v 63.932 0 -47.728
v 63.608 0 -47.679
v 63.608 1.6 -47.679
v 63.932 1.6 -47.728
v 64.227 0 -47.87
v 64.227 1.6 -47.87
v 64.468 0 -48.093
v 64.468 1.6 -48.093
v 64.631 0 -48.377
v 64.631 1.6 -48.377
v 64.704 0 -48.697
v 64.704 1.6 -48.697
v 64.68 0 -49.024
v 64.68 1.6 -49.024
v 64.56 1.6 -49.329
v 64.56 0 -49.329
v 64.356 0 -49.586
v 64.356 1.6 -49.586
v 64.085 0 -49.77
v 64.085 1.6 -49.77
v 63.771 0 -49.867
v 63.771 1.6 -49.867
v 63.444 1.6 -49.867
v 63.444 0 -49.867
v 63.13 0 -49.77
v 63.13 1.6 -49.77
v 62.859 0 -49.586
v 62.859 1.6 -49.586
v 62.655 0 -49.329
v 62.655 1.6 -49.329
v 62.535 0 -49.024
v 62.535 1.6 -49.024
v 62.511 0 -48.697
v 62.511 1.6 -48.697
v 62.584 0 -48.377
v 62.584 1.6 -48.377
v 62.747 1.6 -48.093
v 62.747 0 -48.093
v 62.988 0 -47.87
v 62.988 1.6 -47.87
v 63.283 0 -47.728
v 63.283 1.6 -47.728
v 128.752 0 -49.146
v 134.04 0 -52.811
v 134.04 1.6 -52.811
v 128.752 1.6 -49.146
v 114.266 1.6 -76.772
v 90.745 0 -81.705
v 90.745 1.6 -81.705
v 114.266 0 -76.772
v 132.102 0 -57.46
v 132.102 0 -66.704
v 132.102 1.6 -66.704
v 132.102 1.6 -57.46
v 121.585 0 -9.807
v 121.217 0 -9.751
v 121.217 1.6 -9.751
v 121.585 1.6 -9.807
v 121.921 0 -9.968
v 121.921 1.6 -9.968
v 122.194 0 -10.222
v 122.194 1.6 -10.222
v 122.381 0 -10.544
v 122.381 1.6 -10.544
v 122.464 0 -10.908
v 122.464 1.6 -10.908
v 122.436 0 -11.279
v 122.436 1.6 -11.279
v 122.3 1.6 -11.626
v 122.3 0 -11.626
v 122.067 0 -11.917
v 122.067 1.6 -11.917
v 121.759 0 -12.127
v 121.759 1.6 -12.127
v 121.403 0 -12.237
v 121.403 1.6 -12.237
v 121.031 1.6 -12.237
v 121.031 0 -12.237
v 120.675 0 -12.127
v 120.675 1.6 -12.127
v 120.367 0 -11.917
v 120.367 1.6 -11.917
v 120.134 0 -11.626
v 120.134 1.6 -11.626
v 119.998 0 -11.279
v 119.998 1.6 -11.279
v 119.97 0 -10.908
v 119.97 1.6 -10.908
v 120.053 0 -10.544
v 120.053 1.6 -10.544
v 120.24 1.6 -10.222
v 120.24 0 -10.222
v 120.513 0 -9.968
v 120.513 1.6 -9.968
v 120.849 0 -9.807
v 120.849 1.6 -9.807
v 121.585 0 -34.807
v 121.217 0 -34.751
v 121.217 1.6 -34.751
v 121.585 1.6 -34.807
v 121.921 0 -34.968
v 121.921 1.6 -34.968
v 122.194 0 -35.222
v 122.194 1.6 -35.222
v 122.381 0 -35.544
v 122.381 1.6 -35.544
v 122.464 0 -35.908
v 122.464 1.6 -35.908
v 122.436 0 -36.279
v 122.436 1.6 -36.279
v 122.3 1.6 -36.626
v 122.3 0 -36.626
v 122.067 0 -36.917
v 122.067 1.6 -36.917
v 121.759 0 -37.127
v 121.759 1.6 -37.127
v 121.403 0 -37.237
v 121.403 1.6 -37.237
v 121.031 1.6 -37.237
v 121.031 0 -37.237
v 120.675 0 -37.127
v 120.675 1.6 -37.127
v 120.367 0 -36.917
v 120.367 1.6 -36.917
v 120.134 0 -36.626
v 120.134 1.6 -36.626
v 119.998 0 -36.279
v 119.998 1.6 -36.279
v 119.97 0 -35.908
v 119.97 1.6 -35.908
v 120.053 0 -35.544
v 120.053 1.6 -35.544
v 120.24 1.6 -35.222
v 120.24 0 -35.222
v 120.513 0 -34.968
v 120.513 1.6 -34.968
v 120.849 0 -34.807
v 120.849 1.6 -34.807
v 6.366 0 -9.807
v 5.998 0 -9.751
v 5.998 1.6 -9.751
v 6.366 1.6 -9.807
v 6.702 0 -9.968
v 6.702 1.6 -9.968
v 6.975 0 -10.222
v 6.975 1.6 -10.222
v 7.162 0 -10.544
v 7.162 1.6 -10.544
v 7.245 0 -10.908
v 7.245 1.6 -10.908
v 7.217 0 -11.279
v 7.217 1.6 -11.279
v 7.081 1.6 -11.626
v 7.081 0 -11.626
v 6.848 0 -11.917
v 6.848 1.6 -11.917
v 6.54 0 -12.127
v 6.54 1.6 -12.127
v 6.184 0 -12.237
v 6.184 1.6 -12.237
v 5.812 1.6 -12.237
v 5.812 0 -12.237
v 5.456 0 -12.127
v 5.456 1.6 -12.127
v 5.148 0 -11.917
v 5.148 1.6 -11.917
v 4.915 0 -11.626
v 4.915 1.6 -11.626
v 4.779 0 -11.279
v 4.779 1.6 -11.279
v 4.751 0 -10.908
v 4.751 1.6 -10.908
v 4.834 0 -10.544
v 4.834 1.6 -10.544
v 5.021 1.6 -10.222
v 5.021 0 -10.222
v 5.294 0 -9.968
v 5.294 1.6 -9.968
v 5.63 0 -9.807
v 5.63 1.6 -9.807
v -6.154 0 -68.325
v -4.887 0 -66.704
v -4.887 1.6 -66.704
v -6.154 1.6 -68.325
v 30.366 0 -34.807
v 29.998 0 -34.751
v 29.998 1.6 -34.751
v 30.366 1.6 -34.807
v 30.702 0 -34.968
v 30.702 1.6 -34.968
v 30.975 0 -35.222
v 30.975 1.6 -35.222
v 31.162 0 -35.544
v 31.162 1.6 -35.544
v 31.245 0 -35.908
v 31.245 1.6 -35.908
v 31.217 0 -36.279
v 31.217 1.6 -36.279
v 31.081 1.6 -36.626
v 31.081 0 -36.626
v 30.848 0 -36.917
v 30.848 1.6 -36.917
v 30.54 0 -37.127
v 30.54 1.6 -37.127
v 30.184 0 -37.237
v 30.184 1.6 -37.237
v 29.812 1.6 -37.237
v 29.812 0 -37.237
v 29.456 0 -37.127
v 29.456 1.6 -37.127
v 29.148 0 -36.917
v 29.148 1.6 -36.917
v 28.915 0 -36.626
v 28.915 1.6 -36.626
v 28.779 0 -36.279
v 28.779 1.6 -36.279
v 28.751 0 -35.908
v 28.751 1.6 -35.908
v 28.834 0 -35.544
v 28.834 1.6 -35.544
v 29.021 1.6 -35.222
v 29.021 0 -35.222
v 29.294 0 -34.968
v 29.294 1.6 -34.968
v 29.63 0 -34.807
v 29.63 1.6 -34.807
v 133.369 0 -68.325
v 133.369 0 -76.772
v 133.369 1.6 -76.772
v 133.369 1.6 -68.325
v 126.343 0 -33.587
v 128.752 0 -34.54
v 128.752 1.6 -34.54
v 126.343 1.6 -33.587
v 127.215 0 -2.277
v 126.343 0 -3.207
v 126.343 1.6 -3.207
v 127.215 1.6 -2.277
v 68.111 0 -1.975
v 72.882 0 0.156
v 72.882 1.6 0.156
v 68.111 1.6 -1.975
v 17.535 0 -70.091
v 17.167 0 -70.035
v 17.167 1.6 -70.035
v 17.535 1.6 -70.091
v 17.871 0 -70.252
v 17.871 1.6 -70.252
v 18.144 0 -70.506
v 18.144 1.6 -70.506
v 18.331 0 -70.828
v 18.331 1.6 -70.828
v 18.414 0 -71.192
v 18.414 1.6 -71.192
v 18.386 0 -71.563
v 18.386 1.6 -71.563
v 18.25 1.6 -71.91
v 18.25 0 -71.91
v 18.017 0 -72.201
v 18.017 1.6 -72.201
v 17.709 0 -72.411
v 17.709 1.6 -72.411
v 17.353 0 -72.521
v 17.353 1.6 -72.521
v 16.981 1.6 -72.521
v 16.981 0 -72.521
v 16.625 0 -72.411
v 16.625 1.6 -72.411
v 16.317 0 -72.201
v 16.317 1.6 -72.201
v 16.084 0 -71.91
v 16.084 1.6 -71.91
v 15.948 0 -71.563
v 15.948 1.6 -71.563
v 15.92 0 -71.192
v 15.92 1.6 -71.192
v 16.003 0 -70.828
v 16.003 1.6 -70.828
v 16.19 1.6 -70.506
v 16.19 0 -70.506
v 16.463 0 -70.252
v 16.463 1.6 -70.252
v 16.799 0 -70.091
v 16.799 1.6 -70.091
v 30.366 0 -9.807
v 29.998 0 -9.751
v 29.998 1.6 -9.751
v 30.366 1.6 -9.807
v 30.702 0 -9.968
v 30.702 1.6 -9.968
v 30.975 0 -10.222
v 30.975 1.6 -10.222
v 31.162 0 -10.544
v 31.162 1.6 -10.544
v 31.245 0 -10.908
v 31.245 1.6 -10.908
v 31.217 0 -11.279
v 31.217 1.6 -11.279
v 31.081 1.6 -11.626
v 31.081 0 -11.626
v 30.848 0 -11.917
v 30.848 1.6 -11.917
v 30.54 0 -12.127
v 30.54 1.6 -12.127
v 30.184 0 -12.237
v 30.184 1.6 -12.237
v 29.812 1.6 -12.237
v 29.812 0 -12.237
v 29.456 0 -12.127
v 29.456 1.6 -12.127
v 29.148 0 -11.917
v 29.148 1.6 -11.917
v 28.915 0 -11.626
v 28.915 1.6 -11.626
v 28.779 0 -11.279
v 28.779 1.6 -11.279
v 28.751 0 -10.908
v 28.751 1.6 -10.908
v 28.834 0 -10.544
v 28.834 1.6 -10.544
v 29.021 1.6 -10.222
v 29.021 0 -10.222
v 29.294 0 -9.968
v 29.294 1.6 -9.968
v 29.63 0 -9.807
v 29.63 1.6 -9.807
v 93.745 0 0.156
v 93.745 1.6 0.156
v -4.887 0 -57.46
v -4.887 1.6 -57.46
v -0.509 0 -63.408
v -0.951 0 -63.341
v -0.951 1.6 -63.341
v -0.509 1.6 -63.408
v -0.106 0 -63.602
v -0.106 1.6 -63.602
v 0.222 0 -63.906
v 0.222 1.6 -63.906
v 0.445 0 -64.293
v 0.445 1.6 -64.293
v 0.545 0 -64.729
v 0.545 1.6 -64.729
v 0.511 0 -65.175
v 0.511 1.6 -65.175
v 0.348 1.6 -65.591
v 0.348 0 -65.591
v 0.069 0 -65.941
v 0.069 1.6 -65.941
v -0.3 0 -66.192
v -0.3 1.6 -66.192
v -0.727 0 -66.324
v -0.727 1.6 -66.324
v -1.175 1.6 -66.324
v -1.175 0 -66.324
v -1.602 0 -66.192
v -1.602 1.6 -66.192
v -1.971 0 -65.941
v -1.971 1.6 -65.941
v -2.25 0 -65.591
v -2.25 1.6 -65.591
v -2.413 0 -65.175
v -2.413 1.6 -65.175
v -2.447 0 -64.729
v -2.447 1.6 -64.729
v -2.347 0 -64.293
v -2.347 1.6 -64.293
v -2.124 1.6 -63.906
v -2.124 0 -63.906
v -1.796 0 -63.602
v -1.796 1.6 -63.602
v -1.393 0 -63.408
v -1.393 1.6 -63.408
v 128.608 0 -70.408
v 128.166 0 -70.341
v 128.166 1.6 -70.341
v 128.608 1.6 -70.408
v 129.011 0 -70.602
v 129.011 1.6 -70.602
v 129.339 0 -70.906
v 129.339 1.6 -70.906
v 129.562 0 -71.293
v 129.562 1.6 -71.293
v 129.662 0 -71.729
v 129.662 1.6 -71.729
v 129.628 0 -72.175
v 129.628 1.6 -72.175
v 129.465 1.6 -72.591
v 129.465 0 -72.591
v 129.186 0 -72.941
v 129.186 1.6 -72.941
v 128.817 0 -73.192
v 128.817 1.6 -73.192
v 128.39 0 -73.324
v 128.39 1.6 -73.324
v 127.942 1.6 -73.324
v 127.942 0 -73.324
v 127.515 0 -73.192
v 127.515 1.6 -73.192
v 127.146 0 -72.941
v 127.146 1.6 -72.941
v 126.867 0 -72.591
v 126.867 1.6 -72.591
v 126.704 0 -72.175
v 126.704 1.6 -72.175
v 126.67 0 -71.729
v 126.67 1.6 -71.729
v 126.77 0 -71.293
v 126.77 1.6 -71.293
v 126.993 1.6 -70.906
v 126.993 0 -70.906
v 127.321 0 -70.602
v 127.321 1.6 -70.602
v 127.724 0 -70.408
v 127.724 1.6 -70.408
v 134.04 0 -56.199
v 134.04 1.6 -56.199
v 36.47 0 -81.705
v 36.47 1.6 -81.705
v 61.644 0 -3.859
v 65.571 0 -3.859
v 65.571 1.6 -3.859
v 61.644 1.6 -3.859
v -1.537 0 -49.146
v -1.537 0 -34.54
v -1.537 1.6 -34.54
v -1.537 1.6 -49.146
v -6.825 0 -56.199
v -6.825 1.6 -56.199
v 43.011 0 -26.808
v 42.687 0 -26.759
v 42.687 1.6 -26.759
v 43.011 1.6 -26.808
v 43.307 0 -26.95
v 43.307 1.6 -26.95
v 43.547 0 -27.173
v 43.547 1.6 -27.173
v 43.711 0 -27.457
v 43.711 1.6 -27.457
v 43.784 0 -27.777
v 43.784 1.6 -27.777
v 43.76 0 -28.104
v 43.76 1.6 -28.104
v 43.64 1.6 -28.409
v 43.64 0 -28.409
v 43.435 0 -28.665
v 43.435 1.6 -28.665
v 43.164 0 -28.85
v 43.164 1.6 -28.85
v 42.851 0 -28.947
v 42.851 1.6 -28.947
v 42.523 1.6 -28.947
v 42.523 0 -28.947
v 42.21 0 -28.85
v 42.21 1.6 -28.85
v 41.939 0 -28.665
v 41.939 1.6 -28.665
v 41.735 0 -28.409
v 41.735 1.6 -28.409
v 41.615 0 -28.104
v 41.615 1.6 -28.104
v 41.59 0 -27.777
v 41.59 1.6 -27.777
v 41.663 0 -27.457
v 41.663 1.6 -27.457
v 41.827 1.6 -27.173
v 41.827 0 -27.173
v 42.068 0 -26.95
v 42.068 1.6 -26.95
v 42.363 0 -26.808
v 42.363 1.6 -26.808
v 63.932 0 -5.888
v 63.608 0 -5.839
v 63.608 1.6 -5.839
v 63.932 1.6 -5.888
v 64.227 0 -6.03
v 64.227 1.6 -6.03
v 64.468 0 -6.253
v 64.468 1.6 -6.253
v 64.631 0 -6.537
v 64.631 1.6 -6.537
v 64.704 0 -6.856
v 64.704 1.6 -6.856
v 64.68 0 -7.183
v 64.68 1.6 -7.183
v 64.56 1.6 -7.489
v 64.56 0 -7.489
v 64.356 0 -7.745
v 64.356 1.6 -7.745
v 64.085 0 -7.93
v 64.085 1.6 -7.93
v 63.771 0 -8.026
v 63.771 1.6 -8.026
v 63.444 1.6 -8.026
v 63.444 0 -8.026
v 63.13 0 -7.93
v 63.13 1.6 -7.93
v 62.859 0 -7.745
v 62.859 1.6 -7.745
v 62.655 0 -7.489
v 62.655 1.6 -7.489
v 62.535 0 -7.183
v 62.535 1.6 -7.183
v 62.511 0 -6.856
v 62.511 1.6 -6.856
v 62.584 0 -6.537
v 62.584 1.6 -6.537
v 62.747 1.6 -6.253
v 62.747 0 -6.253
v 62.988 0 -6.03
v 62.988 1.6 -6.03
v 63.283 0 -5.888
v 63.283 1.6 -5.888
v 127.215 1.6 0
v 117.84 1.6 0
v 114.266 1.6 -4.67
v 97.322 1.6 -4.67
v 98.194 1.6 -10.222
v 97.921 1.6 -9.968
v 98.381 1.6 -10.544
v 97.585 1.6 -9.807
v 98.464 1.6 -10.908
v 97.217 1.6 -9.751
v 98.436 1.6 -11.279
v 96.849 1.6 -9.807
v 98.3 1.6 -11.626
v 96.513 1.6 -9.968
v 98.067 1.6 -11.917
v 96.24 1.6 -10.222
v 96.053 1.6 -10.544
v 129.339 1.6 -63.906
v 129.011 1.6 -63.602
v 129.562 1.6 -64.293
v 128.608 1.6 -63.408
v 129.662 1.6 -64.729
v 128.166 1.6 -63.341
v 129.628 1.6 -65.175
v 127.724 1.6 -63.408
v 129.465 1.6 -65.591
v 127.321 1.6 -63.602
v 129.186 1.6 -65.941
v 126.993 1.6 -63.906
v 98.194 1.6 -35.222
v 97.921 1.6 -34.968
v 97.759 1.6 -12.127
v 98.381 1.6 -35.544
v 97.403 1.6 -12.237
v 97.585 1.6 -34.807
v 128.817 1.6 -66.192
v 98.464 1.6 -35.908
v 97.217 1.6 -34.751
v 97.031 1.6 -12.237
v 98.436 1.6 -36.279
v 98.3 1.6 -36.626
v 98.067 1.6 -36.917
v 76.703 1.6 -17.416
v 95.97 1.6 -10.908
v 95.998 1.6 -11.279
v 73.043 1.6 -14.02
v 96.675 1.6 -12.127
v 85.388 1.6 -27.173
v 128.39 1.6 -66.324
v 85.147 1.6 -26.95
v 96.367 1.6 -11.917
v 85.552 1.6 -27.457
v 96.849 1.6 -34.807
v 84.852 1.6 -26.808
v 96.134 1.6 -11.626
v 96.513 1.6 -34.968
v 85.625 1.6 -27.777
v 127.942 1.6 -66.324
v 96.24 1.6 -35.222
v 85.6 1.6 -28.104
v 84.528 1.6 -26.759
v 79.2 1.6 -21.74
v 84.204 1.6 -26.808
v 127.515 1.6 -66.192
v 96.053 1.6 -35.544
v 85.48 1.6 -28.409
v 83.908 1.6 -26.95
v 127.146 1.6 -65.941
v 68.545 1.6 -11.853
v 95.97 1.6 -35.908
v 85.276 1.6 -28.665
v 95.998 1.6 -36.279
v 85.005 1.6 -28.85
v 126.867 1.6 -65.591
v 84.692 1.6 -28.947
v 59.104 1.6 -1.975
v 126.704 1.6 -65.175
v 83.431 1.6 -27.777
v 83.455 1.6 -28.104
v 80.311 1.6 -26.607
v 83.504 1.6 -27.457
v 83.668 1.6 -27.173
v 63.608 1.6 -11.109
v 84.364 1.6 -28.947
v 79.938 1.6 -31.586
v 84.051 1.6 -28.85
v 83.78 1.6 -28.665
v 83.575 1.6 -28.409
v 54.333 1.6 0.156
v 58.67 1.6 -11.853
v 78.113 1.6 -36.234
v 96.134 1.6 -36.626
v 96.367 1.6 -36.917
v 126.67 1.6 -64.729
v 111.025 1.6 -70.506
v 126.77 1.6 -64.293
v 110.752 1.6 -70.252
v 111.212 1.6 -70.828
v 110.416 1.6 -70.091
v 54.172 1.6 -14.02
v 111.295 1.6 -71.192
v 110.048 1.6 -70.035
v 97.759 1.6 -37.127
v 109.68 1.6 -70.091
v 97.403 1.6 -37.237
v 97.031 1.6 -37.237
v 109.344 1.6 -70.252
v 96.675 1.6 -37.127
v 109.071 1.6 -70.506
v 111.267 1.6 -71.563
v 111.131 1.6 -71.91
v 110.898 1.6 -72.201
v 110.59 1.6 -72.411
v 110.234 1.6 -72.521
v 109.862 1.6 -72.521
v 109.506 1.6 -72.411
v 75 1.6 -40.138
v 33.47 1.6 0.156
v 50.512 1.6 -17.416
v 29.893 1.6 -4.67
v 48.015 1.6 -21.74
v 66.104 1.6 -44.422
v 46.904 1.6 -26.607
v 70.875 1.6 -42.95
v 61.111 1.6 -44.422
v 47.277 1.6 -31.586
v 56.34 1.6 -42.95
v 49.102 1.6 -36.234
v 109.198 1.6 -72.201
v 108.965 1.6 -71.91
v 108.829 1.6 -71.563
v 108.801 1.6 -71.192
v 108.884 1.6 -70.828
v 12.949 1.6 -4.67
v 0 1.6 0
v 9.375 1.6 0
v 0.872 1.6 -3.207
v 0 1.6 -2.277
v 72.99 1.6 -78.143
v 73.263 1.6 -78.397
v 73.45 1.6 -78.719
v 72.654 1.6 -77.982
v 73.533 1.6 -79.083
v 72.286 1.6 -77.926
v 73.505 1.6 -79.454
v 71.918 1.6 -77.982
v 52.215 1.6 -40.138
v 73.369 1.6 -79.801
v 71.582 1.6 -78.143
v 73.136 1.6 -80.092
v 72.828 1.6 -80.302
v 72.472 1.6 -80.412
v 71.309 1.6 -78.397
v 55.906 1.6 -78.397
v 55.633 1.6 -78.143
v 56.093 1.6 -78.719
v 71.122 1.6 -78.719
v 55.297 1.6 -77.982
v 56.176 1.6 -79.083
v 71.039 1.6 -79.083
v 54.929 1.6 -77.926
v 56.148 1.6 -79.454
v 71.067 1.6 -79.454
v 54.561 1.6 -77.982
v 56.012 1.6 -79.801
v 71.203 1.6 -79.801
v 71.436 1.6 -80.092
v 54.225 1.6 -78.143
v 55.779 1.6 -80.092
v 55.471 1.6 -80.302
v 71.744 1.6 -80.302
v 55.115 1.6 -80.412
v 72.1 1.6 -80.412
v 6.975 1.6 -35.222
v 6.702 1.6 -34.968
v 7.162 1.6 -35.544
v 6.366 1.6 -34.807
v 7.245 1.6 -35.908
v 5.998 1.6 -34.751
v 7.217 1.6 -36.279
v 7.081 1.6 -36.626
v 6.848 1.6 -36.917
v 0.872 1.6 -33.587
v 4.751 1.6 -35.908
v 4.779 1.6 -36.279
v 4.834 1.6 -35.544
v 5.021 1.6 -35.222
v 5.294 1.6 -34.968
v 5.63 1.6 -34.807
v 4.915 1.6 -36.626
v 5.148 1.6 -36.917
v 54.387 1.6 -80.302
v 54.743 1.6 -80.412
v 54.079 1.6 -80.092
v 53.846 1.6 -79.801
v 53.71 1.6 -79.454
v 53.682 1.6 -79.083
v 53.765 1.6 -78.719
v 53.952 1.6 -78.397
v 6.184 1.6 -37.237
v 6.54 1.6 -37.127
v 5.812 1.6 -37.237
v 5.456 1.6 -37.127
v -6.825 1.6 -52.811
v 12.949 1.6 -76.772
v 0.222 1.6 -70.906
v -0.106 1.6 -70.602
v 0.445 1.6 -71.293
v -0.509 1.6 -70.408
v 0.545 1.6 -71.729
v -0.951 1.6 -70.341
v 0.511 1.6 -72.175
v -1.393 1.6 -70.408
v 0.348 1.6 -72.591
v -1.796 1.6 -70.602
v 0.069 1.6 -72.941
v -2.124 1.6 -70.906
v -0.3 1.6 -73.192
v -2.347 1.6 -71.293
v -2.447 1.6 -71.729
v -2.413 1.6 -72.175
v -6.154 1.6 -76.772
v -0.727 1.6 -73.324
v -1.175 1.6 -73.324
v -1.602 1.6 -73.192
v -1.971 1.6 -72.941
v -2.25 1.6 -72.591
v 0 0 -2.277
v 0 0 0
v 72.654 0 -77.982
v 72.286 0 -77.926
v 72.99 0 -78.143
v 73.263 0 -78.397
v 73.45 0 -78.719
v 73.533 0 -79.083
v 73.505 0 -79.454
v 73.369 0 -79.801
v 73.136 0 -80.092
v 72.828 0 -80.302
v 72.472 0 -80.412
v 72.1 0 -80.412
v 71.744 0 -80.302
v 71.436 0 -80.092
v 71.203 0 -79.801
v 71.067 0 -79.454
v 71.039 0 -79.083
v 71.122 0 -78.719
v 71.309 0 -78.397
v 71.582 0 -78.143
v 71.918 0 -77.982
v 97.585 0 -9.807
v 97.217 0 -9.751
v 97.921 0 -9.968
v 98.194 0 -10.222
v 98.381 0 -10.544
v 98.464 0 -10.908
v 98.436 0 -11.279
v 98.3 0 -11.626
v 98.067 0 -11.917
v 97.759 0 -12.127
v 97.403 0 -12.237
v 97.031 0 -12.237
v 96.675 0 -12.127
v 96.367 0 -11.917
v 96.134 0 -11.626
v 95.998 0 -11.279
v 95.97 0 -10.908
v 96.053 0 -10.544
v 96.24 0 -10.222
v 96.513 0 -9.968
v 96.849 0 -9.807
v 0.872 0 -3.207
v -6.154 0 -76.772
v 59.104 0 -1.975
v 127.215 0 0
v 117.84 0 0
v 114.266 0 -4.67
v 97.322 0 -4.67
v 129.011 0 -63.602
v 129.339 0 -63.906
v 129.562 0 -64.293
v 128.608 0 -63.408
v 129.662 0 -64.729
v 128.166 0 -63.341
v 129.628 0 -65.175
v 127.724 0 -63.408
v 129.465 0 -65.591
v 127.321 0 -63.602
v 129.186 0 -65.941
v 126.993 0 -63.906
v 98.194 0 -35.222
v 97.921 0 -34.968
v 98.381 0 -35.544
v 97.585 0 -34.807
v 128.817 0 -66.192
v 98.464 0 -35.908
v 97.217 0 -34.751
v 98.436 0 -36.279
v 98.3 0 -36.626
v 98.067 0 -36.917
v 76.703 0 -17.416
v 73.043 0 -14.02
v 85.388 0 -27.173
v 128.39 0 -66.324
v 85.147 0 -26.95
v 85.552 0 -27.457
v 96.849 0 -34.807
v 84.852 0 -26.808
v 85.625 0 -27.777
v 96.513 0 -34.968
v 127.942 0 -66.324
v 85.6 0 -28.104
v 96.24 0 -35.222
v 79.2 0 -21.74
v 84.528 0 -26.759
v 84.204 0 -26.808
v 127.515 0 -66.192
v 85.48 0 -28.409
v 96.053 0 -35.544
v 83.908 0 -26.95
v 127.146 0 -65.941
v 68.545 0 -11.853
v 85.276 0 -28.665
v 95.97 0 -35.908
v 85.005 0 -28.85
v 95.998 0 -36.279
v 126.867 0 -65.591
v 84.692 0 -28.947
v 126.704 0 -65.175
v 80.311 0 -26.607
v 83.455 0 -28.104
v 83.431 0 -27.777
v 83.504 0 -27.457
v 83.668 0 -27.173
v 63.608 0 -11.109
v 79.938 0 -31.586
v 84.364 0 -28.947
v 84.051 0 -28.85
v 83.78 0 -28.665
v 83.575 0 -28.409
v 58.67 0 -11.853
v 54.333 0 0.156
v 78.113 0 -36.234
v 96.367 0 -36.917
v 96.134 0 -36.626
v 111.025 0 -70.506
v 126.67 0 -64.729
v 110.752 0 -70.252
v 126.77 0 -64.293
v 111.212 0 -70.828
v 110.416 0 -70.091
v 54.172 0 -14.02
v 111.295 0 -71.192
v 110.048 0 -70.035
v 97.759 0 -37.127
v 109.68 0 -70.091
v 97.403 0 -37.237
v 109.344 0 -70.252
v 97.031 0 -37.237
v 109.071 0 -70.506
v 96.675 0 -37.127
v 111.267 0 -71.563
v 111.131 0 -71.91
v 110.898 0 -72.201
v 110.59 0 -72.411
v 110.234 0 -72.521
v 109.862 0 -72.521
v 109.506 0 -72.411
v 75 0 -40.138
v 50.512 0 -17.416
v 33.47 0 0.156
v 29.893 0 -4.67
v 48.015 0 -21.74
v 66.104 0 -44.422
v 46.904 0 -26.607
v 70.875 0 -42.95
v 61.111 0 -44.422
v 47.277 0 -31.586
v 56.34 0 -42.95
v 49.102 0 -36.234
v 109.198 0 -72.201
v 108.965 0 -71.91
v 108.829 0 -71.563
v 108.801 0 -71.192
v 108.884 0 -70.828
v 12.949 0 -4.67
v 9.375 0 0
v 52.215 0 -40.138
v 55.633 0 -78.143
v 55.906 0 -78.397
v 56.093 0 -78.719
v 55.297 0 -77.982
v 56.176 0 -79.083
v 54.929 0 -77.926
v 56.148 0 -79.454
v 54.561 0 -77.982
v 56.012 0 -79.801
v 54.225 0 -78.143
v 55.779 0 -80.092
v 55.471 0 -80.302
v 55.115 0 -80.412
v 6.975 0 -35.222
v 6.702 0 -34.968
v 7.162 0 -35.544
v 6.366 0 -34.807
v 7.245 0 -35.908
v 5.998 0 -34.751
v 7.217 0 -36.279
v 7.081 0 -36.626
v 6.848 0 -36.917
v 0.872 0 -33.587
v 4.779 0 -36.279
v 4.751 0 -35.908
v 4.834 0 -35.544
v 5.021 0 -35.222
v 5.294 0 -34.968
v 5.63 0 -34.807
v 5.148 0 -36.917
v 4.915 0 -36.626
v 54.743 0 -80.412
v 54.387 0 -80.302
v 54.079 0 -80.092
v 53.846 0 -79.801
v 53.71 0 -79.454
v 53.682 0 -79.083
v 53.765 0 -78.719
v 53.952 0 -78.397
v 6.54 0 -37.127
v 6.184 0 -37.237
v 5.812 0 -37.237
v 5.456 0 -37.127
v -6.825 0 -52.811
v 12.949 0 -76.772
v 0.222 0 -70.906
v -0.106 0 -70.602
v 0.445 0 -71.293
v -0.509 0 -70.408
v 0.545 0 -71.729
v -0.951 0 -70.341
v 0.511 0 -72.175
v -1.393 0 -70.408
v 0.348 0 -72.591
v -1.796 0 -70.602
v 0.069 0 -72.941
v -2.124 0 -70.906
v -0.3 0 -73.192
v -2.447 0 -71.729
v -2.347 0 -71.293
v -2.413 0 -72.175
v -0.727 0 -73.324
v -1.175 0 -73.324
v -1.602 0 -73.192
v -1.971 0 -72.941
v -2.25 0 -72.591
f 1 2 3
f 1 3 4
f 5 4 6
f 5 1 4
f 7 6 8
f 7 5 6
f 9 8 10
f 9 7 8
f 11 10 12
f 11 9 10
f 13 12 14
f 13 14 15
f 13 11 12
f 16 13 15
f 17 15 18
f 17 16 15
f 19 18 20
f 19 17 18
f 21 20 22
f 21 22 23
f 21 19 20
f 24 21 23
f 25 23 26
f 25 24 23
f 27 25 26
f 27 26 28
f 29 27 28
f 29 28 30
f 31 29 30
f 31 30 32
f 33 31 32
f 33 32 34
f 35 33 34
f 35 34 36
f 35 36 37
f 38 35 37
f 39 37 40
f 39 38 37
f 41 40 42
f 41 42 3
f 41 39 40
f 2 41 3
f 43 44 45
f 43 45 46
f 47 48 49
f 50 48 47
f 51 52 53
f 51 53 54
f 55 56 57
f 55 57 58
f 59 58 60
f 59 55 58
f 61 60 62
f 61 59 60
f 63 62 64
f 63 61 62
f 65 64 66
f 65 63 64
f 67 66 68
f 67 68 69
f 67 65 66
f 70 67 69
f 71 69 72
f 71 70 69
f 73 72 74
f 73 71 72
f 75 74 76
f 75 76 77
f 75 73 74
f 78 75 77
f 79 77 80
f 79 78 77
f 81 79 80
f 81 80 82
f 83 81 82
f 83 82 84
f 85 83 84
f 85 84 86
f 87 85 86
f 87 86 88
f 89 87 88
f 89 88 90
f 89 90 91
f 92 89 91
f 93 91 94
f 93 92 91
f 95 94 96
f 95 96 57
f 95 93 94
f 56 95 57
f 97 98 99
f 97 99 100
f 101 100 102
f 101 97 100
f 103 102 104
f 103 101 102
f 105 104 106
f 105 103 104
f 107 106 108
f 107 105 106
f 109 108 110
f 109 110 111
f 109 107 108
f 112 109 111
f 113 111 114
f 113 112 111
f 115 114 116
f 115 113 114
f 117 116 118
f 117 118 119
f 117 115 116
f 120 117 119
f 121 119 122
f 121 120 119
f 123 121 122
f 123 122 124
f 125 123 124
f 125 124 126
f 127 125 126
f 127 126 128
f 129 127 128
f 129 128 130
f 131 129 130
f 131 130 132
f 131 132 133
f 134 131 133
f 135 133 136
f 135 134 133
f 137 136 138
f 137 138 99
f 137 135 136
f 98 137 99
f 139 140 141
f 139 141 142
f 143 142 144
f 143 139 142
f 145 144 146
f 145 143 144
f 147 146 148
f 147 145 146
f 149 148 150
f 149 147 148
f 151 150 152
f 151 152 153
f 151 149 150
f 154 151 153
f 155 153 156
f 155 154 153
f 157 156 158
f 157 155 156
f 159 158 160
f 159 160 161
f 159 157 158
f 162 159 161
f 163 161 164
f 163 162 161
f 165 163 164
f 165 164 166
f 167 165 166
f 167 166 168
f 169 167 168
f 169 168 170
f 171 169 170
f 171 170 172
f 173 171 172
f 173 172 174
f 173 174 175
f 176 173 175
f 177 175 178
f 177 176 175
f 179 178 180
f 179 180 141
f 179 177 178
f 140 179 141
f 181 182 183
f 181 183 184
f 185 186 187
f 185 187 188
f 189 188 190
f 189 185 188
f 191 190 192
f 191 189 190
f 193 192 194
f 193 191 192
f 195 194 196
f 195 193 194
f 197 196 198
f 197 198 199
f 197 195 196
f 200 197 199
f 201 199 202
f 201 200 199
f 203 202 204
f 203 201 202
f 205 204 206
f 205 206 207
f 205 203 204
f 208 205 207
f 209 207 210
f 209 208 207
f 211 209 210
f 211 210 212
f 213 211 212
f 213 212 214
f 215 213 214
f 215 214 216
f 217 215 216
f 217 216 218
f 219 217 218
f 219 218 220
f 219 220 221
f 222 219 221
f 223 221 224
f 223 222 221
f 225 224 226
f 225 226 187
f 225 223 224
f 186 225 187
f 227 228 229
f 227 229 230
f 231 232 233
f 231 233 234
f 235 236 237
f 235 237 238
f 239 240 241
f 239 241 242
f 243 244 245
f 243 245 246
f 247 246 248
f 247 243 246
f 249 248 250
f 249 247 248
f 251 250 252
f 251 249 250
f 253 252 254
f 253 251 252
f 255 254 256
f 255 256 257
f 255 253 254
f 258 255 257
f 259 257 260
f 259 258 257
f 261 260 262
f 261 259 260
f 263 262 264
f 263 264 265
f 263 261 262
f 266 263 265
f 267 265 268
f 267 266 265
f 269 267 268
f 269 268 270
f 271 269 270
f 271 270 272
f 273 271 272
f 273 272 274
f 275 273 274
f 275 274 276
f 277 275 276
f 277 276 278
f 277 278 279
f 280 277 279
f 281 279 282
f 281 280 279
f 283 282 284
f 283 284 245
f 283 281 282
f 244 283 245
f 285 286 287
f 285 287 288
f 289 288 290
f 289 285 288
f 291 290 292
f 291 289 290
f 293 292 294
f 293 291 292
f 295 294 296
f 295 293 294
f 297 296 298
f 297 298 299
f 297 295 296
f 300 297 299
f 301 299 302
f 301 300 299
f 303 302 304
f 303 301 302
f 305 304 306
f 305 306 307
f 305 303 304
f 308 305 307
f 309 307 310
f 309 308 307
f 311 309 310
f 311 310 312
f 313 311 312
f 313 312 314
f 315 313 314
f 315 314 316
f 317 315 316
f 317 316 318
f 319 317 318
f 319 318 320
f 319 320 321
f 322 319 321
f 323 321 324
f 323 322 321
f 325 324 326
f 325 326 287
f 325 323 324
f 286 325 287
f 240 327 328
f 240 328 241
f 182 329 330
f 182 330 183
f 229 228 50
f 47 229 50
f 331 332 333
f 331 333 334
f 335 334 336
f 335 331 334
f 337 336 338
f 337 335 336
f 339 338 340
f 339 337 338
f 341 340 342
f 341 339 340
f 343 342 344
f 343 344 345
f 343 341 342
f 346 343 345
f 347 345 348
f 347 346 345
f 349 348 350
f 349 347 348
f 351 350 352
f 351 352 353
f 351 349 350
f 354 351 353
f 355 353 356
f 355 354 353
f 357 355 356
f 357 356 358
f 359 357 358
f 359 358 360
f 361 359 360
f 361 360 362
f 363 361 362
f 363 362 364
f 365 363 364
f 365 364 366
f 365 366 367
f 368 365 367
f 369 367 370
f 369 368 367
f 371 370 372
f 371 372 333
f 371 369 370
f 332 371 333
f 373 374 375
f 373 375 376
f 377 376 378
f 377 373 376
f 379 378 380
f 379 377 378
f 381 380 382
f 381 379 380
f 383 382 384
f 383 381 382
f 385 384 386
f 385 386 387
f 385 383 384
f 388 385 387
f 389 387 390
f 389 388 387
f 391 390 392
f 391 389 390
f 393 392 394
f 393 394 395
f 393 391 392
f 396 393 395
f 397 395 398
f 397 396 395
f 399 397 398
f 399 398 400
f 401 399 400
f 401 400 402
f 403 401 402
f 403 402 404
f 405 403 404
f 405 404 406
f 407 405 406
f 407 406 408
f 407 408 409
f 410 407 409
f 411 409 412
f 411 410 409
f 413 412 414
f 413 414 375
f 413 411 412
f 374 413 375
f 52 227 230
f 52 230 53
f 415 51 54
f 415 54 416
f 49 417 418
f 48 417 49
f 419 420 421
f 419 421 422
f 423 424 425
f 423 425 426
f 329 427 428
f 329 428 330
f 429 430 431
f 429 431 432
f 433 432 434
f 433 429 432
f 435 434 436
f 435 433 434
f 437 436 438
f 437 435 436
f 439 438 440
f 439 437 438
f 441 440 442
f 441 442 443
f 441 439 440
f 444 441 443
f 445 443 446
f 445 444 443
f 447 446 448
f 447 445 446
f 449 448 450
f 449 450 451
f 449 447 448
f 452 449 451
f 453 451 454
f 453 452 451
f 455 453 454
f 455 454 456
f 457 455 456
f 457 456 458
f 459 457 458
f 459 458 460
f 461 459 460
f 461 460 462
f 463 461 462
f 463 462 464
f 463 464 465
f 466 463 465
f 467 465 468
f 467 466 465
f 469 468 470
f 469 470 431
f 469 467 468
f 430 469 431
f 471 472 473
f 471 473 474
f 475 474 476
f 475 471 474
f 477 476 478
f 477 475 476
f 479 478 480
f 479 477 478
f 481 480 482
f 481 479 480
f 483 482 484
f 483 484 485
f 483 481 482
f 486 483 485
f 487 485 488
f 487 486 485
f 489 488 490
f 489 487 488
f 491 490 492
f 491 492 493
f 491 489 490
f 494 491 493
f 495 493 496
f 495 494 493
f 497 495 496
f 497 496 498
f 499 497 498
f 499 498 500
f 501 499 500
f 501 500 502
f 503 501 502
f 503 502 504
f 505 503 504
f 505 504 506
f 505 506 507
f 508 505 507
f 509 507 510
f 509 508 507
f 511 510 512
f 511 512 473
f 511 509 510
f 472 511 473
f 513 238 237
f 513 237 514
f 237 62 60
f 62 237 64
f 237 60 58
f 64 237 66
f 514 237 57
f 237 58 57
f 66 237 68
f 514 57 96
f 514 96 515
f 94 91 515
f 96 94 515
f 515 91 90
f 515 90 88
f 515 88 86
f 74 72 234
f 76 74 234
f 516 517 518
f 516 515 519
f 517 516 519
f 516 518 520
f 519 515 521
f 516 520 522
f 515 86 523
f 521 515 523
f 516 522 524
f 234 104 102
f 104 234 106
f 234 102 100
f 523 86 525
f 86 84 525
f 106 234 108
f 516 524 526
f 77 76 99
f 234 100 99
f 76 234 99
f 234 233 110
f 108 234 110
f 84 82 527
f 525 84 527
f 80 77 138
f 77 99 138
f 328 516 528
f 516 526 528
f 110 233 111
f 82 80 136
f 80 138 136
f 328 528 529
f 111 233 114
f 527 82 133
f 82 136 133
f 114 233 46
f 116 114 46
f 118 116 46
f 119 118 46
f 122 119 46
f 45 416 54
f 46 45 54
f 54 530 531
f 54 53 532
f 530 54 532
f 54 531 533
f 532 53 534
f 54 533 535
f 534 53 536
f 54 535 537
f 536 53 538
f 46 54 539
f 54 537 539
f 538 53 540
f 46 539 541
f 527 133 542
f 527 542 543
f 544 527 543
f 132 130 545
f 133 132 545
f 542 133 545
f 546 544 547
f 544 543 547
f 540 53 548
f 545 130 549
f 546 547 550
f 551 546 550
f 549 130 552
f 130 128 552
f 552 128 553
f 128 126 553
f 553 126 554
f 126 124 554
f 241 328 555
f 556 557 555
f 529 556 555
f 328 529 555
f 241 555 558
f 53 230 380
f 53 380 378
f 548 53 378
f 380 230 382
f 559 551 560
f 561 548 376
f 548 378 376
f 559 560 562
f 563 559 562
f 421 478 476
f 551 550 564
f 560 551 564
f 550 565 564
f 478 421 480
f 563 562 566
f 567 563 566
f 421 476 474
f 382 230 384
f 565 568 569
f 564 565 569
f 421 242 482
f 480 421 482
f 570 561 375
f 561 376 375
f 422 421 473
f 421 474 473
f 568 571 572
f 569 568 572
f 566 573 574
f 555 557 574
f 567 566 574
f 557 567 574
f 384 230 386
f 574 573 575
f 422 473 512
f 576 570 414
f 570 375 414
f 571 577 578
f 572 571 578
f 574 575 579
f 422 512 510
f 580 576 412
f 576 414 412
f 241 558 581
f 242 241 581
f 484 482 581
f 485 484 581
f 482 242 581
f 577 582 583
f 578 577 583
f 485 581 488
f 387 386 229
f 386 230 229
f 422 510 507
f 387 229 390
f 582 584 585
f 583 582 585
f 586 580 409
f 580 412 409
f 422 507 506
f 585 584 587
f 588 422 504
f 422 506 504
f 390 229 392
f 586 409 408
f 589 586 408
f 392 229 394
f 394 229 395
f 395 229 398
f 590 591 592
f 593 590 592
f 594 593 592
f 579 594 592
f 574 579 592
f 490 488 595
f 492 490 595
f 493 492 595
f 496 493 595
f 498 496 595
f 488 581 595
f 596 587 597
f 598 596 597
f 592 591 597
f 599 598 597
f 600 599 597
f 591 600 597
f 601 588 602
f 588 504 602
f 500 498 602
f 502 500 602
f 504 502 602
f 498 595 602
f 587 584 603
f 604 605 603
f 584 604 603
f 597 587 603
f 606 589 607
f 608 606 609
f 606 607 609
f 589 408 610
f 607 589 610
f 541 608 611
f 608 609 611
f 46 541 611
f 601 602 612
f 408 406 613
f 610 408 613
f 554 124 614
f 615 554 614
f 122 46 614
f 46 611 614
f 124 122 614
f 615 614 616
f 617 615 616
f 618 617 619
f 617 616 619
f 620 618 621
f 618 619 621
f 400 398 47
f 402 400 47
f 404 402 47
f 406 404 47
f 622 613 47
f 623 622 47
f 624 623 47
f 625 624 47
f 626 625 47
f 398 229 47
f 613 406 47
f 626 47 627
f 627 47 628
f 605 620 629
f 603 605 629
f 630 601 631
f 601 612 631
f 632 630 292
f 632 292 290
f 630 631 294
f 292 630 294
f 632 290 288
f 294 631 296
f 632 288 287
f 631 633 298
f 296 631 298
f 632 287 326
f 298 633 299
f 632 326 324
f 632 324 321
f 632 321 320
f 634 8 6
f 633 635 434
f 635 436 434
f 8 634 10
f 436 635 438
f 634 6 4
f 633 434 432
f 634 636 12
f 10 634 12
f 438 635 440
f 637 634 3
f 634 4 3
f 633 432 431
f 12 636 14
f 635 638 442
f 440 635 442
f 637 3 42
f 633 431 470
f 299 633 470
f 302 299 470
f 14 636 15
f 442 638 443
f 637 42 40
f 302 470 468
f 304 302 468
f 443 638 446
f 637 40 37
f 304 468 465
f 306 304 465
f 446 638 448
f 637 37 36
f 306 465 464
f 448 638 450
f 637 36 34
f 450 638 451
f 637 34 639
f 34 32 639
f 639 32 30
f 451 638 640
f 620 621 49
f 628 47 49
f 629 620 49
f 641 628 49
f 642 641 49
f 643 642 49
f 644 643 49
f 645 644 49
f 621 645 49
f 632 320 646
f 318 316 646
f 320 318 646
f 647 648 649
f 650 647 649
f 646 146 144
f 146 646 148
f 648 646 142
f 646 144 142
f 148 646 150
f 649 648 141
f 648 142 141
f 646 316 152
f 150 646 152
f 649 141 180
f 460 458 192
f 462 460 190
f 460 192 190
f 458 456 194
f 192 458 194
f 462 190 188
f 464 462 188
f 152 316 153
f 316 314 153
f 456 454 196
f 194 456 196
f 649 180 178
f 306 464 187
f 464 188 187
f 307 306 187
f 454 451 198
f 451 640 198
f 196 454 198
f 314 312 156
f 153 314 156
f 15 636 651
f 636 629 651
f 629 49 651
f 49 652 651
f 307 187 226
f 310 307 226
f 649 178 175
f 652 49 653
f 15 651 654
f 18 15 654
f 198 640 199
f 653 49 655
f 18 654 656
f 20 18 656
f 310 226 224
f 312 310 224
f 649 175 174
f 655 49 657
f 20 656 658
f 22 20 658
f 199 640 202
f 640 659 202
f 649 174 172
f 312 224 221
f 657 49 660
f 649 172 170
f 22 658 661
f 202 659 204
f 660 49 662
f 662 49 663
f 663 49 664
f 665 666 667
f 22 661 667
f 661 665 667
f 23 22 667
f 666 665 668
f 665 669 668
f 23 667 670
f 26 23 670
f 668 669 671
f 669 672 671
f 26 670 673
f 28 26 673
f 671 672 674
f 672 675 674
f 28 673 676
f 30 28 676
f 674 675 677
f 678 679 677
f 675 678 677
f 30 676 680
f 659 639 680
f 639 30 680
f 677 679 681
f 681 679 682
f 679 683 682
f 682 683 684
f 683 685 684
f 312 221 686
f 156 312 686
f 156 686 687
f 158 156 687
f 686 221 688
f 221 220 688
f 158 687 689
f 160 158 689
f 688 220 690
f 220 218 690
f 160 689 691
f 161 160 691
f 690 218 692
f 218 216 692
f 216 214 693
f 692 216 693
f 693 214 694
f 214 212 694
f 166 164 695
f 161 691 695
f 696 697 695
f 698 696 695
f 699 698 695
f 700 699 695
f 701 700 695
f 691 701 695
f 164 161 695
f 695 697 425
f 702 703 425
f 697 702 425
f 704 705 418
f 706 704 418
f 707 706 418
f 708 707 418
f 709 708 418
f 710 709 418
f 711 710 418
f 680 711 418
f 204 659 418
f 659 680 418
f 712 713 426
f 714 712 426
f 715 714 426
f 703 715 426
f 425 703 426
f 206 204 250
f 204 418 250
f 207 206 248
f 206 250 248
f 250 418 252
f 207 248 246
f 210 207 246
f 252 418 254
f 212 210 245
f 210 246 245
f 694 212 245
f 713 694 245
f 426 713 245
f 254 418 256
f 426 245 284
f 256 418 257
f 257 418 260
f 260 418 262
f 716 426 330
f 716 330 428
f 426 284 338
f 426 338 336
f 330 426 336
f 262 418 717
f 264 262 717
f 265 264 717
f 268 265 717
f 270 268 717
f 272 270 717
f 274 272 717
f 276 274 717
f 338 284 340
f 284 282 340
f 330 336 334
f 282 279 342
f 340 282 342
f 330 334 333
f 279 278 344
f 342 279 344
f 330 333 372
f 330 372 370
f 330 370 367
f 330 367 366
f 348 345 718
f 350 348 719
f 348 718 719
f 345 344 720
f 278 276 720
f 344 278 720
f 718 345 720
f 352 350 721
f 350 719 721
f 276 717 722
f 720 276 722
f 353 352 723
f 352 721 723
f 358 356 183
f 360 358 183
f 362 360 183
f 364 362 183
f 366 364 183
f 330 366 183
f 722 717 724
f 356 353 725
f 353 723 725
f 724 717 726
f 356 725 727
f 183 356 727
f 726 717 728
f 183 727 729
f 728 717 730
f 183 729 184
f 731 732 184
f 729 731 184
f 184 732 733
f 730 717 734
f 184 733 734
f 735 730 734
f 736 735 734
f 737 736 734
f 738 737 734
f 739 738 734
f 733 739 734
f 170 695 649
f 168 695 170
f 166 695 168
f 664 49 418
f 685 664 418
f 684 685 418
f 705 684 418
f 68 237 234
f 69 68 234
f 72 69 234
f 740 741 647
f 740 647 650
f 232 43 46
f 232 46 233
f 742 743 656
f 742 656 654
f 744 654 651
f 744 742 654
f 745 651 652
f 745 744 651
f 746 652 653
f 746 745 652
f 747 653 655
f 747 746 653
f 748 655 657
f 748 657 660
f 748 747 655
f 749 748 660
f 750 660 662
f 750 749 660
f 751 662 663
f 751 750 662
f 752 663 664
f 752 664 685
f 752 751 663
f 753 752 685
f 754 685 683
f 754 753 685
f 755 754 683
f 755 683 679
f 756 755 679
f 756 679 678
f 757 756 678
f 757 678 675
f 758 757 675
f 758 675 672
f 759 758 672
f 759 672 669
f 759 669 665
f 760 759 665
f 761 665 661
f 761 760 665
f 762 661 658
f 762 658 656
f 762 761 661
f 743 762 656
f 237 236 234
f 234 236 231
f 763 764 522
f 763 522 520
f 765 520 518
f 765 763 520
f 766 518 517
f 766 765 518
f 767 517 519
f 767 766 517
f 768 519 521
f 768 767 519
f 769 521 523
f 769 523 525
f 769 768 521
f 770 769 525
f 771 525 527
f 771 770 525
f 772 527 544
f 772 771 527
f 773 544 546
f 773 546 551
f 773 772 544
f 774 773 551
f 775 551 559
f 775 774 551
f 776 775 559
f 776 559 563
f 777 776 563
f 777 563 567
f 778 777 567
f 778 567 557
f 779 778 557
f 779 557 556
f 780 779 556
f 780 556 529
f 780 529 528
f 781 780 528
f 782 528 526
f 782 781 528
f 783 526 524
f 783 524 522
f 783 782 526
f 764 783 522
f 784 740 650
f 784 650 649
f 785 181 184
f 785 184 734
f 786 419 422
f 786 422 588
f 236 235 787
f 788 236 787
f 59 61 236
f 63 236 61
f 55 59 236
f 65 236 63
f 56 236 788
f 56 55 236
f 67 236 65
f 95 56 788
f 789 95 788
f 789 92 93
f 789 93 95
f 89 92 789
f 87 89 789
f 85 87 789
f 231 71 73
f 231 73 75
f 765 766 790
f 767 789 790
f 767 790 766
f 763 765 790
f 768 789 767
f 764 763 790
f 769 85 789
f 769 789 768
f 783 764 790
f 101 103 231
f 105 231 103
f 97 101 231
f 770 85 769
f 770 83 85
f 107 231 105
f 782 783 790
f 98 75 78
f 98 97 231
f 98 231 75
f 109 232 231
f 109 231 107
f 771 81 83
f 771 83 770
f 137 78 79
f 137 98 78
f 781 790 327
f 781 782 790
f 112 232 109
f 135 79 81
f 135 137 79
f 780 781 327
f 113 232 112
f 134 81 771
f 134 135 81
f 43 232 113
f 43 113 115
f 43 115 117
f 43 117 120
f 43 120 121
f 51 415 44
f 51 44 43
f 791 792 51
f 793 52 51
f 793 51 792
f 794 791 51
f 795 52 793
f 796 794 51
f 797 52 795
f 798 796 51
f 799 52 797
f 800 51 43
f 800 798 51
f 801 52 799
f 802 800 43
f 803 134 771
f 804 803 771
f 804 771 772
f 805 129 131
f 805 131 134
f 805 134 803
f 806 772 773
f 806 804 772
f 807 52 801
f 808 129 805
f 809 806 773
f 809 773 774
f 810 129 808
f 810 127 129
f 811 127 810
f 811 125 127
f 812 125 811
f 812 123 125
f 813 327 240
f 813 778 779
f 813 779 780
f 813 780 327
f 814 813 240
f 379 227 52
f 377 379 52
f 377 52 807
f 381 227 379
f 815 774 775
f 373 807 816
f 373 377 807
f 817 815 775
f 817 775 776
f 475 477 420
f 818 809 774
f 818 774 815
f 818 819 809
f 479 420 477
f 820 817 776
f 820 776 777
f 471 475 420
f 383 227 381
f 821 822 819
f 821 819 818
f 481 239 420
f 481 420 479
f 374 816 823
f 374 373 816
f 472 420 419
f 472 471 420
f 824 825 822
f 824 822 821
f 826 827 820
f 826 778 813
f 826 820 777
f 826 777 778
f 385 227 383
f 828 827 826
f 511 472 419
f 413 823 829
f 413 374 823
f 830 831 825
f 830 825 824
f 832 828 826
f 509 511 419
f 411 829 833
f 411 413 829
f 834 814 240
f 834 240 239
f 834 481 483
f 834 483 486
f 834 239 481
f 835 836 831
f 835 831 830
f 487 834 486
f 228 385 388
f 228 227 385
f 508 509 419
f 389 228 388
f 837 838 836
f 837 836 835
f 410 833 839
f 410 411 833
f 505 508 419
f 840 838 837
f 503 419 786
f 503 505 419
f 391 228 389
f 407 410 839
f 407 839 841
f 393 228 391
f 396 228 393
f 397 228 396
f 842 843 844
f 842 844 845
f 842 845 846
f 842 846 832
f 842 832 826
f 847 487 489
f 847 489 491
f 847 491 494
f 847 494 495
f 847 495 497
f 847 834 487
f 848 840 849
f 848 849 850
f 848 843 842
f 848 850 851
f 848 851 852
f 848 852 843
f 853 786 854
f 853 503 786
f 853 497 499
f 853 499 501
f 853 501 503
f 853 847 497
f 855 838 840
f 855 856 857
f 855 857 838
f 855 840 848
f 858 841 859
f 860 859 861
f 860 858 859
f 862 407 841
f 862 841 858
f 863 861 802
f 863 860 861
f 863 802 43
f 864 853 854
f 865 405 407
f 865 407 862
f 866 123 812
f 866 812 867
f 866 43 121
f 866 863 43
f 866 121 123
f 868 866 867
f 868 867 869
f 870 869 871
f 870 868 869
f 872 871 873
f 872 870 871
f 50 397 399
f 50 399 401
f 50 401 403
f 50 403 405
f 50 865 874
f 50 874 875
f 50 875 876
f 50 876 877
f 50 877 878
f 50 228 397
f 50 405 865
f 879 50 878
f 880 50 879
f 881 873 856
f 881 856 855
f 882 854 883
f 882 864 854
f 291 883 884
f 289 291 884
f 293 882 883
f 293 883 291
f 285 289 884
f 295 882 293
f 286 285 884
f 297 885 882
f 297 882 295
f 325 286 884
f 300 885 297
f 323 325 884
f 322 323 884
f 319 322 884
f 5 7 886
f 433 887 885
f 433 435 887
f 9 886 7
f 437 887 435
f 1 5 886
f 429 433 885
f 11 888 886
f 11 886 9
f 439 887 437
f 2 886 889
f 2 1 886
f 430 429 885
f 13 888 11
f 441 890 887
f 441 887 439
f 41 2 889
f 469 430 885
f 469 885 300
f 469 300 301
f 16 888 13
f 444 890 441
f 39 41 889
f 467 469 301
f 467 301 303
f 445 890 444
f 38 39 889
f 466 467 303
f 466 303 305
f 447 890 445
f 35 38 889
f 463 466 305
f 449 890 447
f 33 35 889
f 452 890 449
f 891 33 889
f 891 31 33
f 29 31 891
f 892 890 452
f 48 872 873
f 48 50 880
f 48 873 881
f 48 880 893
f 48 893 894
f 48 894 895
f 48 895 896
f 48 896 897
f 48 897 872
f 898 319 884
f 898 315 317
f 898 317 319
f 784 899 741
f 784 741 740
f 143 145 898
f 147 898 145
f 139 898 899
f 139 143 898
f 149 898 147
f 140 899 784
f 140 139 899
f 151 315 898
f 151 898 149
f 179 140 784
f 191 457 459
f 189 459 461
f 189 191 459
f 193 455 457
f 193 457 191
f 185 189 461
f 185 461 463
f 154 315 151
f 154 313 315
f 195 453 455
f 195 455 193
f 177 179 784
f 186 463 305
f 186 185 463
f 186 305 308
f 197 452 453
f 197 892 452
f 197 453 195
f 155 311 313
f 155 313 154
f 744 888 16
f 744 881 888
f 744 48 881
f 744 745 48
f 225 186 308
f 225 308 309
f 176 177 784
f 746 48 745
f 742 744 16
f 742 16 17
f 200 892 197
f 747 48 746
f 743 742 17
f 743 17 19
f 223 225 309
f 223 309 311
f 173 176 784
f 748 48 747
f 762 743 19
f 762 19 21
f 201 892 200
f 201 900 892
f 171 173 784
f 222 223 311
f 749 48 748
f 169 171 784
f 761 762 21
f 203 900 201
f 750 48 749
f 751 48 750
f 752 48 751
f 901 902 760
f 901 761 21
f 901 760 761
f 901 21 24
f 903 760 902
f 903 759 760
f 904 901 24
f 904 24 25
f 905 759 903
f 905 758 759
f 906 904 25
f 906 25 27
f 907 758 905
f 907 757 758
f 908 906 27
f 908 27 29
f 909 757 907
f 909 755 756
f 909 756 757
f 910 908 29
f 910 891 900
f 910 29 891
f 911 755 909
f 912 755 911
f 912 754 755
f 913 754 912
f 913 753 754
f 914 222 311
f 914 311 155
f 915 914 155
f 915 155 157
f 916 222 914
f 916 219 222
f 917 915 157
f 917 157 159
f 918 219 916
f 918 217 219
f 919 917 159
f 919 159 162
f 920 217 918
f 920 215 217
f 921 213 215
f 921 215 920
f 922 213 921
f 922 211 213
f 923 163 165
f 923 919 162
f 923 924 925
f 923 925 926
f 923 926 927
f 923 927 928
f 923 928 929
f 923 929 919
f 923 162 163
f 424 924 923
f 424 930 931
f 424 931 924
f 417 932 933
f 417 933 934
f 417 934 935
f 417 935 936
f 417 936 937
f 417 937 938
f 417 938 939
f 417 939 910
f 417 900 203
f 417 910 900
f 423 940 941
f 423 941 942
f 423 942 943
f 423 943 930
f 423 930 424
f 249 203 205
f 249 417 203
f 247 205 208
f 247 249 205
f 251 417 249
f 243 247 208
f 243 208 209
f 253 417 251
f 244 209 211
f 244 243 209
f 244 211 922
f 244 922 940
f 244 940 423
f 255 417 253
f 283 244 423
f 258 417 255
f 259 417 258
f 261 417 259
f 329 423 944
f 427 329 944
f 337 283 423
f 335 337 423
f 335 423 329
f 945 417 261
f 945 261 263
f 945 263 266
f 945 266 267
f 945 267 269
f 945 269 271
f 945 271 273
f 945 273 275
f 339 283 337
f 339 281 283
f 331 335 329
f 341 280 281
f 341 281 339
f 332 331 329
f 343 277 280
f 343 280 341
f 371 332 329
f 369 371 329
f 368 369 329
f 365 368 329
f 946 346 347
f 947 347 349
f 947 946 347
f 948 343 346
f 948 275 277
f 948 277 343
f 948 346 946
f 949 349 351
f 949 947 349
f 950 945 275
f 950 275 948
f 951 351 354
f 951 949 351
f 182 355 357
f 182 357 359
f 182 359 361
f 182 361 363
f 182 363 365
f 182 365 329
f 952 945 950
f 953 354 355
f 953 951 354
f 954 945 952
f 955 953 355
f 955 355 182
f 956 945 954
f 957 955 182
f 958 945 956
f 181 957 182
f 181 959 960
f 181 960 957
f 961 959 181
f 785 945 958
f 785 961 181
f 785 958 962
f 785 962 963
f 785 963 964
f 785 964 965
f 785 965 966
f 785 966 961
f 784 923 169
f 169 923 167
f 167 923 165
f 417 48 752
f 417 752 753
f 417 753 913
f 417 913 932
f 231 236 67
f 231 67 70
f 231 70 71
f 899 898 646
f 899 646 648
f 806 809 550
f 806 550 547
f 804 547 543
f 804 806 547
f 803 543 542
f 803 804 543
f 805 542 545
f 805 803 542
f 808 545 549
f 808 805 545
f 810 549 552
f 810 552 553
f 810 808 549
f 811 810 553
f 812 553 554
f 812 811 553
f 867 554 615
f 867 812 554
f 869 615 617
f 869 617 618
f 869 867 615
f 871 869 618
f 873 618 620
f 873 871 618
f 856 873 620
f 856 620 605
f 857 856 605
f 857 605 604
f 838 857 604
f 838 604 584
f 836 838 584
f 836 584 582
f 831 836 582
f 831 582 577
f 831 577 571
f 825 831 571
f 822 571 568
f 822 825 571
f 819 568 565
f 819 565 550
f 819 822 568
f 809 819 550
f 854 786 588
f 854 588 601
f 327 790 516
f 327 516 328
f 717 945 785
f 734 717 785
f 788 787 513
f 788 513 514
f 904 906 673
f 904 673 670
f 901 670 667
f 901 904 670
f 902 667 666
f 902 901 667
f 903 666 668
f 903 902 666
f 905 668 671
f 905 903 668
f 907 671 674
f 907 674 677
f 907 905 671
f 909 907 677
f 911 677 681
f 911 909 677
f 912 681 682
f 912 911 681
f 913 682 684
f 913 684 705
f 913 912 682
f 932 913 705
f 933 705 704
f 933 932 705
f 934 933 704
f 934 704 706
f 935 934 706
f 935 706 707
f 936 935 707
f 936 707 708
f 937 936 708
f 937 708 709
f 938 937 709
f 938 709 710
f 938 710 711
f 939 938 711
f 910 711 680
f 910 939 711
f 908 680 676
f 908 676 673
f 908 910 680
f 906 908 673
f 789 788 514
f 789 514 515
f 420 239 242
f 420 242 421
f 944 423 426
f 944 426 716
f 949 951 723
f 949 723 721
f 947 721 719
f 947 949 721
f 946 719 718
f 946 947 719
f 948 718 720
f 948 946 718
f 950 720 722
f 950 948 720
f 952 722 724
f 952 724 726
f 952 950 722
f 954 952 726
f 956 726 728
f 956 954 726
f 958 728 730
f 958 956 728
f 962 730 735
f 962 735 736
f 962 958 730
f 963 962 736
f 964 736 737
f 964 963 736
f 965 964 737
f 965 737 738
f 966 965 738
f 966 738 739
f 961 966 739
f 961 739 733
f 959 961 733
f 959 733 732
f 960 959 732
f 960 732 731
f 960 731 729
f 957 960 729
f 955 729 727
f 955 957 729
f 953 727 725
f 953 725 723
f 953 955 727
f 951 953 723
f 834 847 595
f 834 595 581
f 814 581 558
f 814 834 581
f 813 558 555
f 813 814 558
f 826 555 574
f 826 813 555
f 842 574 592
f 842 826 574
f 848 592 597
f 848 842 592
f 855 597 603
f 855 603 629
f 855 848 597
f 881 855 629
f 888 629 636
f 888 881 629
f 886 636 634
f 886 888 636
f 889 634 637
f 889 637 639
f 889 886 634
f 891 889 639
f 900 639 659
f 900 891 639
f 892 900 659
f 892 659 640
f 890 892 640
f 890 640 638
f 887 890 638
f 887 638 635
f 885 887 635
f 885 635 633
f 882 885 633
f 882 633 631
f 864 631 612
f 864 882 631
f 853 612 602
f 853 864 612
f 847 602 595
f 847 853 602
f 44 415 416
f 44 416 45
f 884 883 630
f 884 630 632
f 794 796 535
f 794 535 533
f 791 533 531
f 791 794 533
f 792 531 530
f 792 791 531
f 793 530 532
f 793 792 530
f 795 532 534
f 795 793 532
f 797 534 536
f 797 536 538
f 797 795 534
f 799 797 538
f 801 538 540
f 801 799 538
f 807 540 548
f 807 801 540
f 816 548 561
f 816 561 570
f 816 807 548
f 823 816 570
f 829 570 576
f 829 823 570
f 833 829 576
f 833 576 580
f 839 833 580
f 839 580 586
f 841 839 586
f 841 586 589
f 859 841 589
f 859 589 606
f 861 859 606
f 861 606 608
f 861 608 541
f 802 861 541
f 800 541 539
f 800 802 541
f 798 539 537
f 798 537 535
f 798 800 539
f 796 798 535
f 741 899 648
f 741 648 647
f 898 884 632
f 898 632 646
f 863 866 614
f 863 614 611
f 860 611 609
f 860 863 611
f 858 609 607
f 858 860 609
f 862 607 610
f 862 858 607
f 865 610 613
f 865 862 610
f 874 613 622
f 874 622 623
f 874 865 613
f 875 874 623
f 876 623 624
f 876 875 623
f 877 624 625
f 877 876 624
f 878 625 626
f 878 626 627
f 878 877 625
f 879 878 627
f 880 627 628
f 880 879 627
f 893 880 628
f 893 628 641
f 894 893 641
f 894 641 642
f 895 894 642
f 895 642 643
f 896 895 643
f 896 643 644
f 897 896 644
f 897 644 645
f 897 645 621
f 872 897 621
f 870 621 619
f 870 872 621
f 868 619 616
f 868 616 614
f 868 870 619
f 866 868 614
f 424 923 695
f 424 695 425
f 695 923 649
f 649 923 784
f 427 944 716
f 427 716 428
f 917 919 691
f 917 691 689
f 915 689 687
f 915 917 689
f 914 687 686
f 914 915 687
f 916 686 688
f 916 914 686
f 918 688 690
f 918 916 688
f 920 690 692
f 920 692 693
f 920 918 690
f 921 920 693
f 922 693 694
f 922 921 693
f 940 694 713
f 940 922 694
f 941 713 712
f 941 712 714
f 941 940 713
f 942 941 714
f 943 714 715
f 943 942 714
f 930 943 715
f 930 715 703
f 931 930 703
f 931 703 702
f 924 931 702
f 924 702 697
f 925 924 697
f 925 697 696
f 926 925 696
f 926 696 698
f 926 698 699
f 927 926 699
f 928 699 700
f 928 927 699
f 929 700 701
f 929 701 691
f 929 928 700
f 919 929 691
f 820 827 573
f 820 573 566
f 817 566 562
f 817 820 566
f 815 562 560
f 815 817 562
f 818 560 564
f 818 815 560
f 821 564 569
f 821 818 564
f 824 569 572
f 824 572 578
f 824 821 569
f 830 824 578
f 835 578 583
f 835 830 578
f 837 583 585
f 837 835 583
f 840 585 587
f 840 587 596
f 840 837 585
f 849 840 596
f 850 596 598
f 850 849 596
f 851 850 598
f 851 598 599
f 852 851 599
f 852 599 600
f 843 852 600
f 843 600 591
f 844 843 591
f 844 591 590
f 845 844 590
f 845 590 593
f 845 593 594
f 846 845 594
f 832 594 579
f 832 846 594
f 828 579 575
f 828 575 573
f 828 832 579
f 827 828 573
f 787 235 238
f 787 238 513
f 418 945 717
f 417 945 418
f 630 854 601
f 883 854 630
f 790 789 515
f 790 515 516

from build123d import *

# Parameters (mm, degrees)
CROQUIS1_R              = 1.25
CROQUIS1_R_2            = 1.5
CROQUIS1_R_3            = 16.75
CROQUIS1_R_4            = 1.1
SALIENTE_EXTRUIR1_DEPTH = 1.6


with BuildPart() as part:
    # Croquis1 → Saliente-Extruir1 (new body)
    with BuildSketch(Plane(origin=(0, 0, 0), x_dir=(1, 0, 0), z_dir=(0, 1, 0))):
        Polygon((65.571001722, 3.859007926), (61.644001722, 3.859007926), (59.104001722, 1.975007926), (54.333001722, -0.155992074), (33.470001722, -0.155992074), (29.893001722, 4.670007926), (12.949494381, 4.670007926), (9.375001722, 7.926e-06), (1.722e-06, 7.926e-06), (1.722e-06, 2.277007926), (0.872001722, 3.207007926), (0.872001722, 21.491007926), (0.872001722, 33.587260304), (-1.536998278, 34.539963538), (-1.536998278, 49.146007926), (-6.824998278, 52.811007926), (-6.824998278, 56.199007926), (-4.886998278, 57.460007926), (-4.886998278, 66.704007926), (-6.153998278, 68.325007926), (-6.153998278, 76.772007926), (-2.987377359, 76.772007926), (12.949494381, 76.772007926), (36.470001722, 81.705007926), (90.745001722, 81.705007926), (114.265509063, 76.772007926), (130.202380802, 76.772007926), (133.369001722, 76.772007926), (133.369001722, 68.325007926), (132.102001722, 66.704007926), (132.102001722, 57.460007926), (134.040001722, 56.199007926), (134.040001722, 52.811007926), (128.752001722, 49.146007926), (128.752001722, 34.539963538), (126.343001722, 33.587260304), (126.343001722, 21.491007926), (126.343001722, 3.207007926), (127.215001722, 2.277007926), (127.215001722, 7.926e-06), (117.840001722, 7.926e-06), (114.265509063, 4.670007926), (97.322001722, 4.670007926), (93.745001722, -0.155992074), (72.882001722, -0.155992074), (68.111001722, 1.975007926), align=None)
        with Locations(Location((5.998001722, 11.001007926, 0), (0, 0, 270))):
            Circle(CROQUIS1_R, mode=Mode.SUBTRACT)
        with Locations(Location((5.998001722, 36.001007926, 0), (0, 0, 270))):
            Circle(CROQUIS1_R, mode=Mode.SUBTRACT)
        with Locations(Location((121.217001722, 36.001007926, 0), (0, 0, 270))):
            Circle(CROQUIS1_R, mode=Mode.SUBTRACT)
        with Locations(Location((121.217001722, 11.001007926, 0), (0, 0, 270))):
            Circle(CROQUIS1_R, mode=Mode.SUBTRACT)
        with Locations(Location((-0.950998278, 71.841007926, 0), (0, 0, 270))):
            Circle(CROQUIS1_R_2, mode=Mode.SUBTRACT)
        with Locations(Location((-0.950998278, 64.841007926, 0), (0, 0, 270))):
            Circle(CROQUIS1_R_2, mode=Mode.SUBTRACT)
        with Locations(Location((17.167001722, 71.285007926, 0), (0, 0, 270))):
            Circle(CROQUIS1_R, mode=Mode.SUBTRACT)
        with Locations(Location((54.929001722, 79.176007926, 0), (0, 0, 270))):
            Circle(CROQUIS1_R, mode=Mode.SUBTRACT)
        with Locations(Location((29.998001722, 36.001007926, 0), (0, 0, 270))):
            Circle(CROQUIS1_R, mode=Mode.SUBTRACT)
        with Locations(Location((29.998001722, 11.001007926, 0), (0, 0, 270))):
            Circle(CROQUIS1_R, mode=Mode.SUBTRACT)
        with Locations(Location((97.217001722, 11.001007926, 0), (0, 0, 270))):
            Circle(CROQUIS1_R, mode=Mode.SUBTRACT)
        with Locations(Location((97.217001722, 36.001007926, 0), (0, 0, 270))):
            Circle(CROQUIS1_R, mode=Mode.SUBTRACT)
        with Locations(Location((72.286001722, 79.176007926, 0), (0, 0, 270))):
            Circle(CROQUIS1_R, mode=Mode.SUBTRACT)
        with Locations(Location((110.048001722, 71.285007926, 0), (0, 0, 270))):
            Circle(CROQUIS1_R, mode=Mode.SUBTRACT)
        with Locations(Location((128.166001722, 64.841007926, 0), (0, 0, 270))):
            Circle(CROQUIS1_R_2, mode=Mode.SUBTRACT)
        with Locations(Location((128.166001722, 71.841007926, 0), (0, 0, 270))):
            Circle(CROQUIS1_R_2, mode=Mode.SUBTRACT)
        with Locations(Location((63.607501722, 27.859007926, 0), (0, 0, 270))):
            Circle(CROQUIS1_R_3, mode=Mode.SUBTRACT)
        with Locations(Location((63.607501722, 48.779312854, 0), (0, 0, 270))):
            Circle(CROQUIS1_R_4, mode=Mode.SUBTRACT)
        with Locations(Location((84.52780665, 27.859007926, 0), (0, 0, 270))):
            Circle(CROQUIS1_R_4, mode=Mode.SUBTRACT)
        with Locations(Location((63.607501722, 6.938702998, 0), (0, 0, 270))):
            Circle(CROQUIS1_R_4, mode=Mode.SUBTRACT)
        with Locations(Location((42.687196794, 27.859007926, 0), (0, 0, 270))):
            Circle(CROQUIS1_R_4, mode=Mode.SUBTRACT)
    extrude(amount=SALIENTE_EXTRUIR1_DEPTH)


solid = part.part
